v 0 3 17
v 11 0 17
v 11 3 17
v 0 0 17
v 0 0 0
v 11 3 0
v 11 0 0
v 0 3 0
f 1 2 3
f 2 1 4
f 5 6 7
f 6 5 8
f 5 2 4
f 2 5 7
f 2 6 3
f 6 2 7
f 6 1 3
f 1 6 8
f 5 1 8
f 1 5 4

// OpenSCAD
// Generated by SolidPython 1.0.1 on 2020-07-29 00:46:55


cube(size = [11, 3, 17]);
/***********************************************
*********      SolidPython code:      **********
************************************************
 
# import packages: SolidPython
from solid import *
from solid.utils import *
from itertools import chain, combinations, permutations


class Resize:

    def __init__(self, scad_file):
        self.scad_file = scad_file
        #self.scad_file = import_scad(scad_file)
        # cone/cylinder param:
        self.r1 = 0
        self.r2 = 0
        self.h = 0
        # rectangular prism param:
        self.w = 0
        self.l = 0
        # ellipse param:
        self.r = 0

    # import OpenScad code (file name corresponds to shape)


    # classify shape + parameters
    def assign(self, param1, param2, param3):
        if self.scad_file == 'cone.scad':
            self.r1 = param1
            self.r2 = param2
            self.h = param3
        elif self.scad_file == 'cylinder.scad':
            self.r1 = param1
            self.r2 = param2
            self.h = param3
        elif self.scad_file == 'rectangularPrism.scad':
            self.h = param1
            self.l = param2
            self.w = param3
        else:
            self.r = param1
            self.h = param2

    # resize parameters
    def iterate(self):
        x = range(3, 20, 2)
        i = 1
        if self.scad_file == 'cone.scad':
            tempList = list(permutations(x, 2))
            for temp in tempList:
                param1 = temp[0]
                param2 = temp[1]
                filepath = 'produced_scad_files/' + 'cone' + str(param1) + '_' + str(param2) + '_' + '.scad'
                scad_render_to_file(cylinder(h=param1, r1=param2, r2=0), filepath)

        elif self.scad_file == 'cylinder.scad':
            tempList = list(permutations(x, 3))
            for temp in tempList:
                param1 = temp[0]
                param2 = temp[1]
                filepath = 'produced_scad_files/' + 'cylinder' + str(param1) + '_' + str(param2) + '_' + '.scad'
                scad_render_to_file(cylinder(h=param1, r1=param2, r2=param2), filepath)

        elif self.scad_file == 'rectangularPrism.scad':
            tempList = list(permutations(x, 3))
            for temp in tempList:
                param1 = temp[0]
                param2 = temp[1]
                param3 = temp[2]
                filepath = 'produced_scad_files/' + 'rectangularPrism' + str(param1) + '_' + str(param2) + '_' + str(
                    param3) + '.scad'
                scad_render_to_file(cube(size=(param1, param2, param3)), filepath)

        elif self.scad_file == 'ellipse.scad':
            tempList = list(permutations(x, 4))
            for temp in tempList:
                param1 = temp[0]
                param2 = temp[1]
                param3 = temp[2]
                param4 = temp[3]
                filepath = 'produced_scad_files/' + 'ellipse' + str(param1) + '_' + str(param2) + '_' + str(param3) + '_' + str(param4) + '.scad'
                scad_render_to_file(scale([param1, param2, param3])(sphere(r=param4)), filepath)

    def render_to_scadfile(self):
        scad_render_to_file(scad, 'example.scad') 
 
************************************************/
